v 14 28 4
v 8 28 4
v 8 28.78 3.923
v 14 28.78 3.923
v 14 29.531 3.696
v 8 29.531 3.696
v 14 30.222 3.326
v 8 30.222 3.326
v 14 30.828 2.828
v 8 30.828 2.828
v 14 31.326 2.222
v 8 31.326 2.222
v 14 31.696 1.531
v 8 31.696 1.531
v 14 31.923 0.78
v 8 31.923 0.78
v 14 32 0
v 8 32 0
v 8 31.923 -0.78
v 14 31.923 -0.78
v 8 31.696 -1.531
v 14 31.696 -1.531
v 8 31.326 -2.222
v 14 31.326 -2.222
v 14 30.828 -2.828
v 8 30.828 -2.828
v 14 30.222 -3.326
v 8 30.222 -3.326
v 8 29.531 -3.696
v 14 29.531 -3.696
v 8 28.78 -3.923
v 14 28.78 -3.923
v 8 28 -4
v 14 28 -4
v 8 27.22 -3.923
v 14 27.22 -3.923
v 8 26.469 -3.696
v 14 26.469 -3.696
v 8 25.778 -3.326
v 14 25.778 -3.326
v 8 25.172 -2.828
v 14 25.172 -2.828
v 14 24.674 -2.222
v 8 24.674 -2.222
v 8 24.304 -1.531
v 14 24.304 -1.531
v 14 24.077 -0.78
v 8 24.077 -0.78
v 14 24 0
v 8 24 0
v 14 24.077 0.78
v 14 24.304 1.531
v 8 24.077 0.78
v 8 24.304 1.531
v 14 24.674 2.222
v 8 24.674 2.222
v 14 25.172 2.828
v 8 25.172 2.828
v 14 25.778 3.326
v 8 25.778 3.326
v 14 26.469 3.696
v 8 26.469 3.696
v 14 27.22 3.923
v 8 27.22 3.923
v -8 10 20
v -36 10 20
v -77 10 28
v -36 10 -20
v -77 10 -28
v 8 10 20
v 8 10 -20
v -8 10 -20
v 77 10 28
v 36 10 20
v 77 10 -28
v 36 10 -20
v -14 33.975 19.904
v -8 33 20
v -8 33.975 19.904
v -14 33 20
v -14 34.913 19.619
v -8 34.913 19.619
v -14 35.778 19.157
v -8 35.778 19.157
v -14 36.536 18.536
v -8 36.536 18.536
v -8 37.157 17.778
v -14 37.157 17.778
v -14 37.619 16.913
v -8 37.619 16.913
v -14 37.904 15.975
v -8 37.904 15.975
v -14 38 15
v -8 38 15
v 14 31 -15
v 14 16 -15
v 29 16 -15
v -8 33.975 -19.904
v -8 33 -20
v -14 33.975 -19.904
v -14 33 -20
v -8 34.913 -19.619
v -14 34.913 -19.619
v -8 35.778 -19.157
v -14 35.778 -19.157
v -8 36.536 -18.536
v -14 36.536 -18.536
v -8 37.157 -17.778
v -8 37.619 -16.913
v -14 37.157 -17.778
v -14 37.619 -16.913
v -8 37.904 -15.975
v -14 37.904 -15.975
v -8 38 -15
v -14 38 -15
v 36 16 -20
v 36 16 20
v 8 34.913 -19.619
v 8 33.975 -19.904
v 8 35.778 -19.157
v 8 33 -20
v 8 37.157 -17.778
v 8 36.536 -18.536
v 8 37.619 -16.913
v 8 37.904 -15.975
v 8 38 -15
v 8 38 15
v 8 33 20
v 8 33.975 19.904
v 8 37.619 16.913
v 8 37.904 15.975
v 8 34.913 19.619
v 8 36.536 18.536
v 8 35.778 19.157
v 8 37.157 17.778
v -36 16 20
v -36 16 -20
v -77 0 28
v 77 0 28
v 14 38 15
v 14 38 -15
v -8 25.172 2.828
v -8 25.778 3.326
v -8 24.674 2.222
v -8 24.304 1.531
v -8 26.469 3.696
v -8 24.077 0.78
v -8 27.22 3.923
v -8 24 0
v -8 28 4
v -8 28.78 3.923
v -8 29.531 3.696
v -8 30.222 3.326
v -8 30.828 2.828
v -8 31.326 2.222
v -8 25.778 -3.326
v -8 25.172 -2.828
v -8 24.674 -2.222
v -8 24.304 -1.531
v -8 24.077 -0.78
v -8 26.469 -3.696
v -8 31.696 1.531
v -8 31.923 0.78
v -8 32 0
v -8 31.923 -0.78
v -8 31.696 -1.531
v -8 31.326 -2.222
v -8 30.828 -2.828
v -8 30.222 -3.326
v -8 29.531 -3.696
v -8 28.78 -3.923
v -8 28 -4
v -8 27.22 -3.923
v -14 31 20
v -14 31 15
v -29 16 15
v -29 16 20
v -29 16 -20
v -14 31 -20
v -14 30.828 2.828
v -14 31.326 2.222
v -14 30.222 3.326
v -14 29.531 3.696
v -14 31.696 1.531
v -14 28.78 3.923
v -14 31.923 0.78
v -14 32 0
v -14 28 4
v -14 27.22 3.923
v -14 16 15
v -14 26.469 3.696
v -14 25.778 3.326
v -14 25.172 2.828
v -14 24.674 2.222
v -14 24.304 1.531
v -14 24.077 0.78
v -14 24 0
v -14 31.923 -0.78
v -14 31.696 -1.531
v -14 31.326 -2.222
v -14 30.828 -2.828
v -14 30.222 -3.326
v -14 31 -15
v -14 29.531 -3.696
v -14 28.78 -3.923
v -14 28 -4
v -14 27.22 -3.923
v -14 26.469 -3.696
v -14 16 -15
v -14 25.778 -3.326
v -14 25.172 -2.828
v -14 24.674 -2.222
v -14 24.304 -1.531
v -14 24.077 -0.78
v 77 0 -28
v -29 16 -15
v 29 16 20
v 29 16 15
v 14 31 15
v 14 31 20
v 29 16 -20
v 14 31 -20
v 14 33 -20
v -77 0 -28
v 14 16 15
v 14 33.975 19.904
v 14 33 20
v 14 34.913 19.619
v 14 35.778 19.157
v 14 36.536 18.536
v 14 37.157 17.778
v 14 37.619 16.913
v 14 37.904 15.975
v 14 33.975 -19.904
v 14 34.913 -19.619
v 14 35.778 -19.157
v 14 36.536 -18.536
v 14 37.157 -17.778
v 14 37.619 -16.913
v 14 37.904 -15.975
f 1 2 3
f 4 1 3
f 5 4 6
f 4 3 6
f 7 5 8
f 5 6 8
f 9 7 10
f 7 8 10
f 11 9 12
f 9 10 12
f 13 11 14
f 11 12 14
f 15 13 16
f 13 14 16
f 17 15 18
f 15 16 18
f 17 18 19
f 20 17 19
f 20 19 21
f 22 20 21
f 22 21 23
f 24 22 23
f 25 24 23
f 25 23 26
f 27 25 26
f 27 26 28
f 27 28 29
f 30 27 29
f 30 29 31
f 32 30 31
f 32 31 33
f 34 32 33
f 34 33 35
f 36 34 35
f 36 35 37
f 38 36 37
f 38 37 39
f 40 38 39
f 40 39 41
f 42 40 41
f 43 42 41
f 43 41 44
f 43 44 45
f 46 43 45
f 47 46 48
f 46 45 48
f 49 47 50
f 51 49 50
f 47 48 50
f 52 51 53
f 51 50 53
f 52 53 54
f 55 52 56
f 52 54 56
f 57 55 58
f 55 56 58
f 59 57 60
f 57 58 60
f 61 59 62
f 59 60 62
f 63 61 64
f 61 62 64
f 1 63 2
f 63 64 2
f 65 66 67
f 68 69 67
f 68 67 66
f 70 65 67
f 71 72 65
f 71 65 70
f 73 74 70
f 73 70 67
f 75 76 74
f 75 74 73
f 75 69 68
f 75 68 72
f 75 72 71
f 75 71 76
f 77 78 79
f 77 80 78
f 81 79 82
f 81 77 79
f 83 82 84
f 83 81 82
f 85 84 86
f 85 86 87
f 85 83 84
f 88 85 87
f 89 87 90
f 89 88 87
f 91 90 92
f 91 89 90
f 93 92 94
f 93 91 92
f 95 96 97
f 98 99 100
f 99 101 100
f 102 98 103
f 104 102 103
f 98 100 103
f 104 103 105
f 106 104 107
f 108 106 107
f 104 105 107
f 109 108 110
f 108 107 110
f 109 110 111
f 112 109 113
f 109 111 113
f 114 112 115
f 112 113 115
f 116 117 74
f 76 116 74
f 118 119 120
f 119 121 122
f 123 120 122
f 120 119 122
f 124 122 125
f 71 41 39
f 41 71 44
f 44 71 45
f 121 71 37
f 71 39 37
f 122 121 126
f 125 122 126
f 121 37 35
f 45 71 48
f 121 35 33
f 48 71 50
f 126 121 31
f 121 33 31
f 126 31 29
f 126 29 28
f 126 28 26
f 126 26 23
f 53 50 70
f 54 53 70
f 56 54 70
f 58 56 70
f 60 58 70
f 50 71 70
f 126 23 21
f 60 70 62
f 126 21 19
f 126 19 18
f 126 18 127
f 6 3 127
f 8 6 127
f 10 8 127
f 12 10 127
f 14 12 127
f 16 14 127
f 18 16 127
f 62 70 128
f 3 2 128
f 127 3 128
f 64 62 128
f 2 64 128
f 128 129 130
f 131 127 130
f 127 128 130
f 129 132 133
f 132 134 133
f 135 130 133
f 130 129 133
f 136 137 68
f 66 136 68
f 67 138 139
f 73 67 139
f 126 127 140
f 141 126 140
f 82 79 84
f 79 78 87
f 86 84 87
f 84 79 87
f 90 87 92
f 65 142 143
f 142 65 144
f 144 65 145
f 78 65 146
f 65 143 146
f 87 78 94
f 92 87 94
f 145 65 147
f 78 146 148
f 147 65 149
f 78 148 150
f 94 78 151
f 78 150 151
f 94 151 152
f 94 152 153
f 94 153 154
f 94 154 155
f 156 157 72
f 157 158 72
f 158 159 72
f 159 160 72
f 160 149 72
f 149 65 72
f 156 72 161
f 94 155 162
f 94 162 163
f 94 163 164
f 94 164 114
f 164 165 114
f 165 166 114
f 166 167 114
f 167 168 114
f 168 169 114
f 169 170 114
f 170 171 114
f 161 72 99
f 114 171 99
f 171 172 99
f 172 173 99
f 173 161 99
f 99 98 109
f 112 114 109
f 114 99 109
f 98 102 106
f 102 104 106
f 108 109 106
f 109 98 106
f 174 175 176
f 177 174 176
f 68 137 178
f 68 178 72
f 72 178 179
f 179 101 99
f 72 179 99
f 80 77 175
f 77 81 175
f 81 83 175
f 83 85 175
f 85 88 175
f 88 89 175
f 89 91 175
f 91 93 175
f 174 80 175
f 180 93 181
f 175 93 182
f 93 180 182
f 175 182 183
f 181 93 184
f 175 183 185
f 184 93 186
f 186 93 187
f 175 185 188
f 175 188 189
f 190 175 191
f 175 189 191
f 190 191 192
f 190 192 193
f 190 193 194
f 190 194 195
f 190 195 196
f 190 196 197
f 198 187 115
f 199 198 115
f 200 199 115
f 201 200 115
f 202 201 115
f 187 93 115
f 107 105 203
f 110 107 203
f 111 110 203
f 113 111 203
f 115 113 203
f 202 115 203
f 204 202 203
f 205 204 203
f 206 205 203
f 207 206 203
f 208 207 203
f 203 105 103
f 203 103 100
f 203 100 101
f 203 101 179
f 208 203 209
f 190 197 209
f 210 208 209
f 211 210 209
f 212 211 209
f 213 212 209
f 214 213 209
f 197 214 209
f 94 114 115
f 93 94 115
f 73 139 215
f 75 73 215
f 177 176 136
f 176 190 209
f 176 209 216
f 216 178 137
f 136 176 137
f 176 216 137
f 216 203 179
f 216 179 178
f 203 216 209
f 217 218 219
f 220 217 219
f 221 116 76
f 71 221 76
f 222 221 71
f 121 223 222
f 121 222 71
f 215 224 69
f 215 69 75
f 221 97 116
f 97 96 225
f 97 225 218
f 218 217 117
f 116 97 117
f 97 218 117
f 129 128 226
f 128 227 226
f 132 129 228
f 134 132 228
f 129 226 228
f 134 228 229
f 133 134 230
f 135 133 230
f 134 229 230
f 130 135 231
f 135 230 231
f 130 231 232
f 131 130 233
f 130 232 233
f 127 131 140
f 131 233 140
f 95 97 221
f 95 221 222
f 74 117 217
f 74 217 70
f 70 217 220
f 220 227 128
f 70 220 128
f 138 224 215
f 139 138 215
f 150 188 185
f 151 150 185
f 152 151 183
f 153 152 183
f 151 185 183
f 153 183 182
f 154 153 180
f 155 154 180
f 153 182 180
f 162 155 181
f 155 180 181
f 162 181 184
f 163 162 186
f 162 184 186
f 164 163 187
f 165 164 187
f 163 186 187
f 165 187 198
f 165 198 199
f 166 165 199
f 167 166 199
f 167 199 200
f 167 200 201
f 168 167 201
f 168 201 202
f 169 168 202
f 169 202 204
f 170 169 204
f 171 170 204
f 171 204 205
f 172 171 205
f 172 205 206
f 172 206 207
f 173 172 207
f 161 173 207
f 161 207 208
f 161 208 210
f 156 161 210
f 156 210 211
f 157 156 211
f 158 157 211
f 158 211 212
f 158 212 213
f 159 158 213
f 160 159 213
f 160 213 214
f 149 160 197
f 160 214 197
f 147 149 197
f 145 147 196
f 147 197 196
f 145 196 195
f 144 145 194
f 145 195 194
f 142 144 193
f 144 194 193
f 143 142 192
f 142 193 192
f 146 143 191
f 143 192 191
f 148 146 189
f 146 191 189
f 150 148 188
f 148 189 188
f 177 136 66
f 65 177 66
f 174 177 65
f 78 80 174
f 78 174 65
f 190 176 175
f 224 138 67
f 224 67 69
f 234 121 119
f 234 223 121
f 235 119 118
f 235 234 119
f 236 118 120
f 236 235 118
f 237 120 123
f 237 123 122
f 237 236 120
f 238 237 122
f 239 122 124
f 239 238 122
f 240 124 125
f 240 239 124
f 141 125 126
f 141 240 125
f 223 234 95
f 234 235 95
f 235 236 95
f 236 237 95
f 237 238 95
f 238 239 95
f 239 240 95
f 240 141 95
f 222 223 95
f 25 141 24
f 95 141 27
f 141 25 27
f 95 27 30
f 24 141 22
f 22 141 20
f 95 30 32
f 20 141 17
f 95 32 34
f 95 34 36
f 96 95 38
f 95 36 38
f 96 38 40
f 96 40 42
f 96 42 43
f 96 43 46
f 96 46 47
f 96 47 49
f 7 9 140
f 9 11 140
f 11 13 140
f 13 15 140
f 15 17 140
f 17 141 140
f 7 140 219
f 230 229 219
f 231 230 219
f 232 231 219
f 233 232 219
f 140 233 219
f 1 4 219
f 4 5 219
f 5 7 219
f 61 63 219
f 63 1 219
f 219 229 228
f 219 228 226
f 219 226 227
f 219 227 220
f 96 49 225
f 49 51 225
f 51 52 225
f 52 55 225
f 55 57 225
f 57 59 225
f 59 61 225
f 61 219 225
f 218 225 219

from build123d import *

# Parameters (mm, degrees)
SKETCH1_W           = 154
SKETCH1_H           = 56
PLATE_DEPTH         = 10
BOSS_EXTRUDE1_DEPTH = 20
CORNER_START        = -15
CORNER_DEPTH        = 5
CORNER2_START       = 15
CORNER2_DEPTH       = 5
SKETCH3_R           = 4
CUT_EXTRUDE1_DEPTH  = 28
FILLET1_R           = 5


with BuildPart() as part:
    # Sketch1 → plate (new body)
    with BuildSketch(Plane(origin=(0, 0, 0), x_dir=(1, 0, 0), z_dir=(0, 1, 0))):
        Rectangle(SKETCH1_W, SKETCH1_H)
    extrude(amount=PLATE_DEPTH)

    # Sketch2 → Boss-Extrude1 (add, symmetric)
    with BuildSketch(Plane.XY):
        Polygon((-8, 10), (-8, 38), (-14, 38), (-14, 16), (-36, 16), (-36, 10), align=None)
        Polygon((36, 16), (36, 10), (8, 10), (8, 38), (14, 38), (14, 16), align=None)
    extrude(amount=BOSS_EXTRUDE1_DEPTH, both=True)

    # Sketch2<4> → Corner (add)
    with BuildSketch(Plane.XY.offset(CORNER_START)):
        Polygon((-14, 16), (-14, 31), (-29, 16), align=None)
        Polygon((29, 16), (14, 31), (14, 16), align=None)
    extrude(amount=-CORNER_DEPTH)

    # Sketch2<3> → Corner2 (add)
    with BuildSketch(Plane.XY.offset(CORNER2_START)):
        Polygon((-14, 16), (-14, 31), (-29, 16), align=None)
        Polygon((29, 16), (14, 31), (14, 16), align=None)
    extrude(amount=CORNER2_DEPTH)

    # Sketch3 → Cut-Extrude1 (cut)
    with BuildSketch(Plane.ZY.offset(14)):
        with Locations((0, 28)):
            Circle(SKETCH3_R)
    extrude(amount=-CUT_EXTRUDE1_DEPTH, mode=Mode.SUBTRACT)

    # Fillet1
    fillet1_edges = [part.edges().sort_by_distance(p)[0] for p in [
        (-11, 38, -20),
        (-11, 38, 20),
        (11, 38, 20),
        (11, 38, -20),
    ]]
    fillet(fillet1_edges, radius=FILLET1_R)


solid = part.part
